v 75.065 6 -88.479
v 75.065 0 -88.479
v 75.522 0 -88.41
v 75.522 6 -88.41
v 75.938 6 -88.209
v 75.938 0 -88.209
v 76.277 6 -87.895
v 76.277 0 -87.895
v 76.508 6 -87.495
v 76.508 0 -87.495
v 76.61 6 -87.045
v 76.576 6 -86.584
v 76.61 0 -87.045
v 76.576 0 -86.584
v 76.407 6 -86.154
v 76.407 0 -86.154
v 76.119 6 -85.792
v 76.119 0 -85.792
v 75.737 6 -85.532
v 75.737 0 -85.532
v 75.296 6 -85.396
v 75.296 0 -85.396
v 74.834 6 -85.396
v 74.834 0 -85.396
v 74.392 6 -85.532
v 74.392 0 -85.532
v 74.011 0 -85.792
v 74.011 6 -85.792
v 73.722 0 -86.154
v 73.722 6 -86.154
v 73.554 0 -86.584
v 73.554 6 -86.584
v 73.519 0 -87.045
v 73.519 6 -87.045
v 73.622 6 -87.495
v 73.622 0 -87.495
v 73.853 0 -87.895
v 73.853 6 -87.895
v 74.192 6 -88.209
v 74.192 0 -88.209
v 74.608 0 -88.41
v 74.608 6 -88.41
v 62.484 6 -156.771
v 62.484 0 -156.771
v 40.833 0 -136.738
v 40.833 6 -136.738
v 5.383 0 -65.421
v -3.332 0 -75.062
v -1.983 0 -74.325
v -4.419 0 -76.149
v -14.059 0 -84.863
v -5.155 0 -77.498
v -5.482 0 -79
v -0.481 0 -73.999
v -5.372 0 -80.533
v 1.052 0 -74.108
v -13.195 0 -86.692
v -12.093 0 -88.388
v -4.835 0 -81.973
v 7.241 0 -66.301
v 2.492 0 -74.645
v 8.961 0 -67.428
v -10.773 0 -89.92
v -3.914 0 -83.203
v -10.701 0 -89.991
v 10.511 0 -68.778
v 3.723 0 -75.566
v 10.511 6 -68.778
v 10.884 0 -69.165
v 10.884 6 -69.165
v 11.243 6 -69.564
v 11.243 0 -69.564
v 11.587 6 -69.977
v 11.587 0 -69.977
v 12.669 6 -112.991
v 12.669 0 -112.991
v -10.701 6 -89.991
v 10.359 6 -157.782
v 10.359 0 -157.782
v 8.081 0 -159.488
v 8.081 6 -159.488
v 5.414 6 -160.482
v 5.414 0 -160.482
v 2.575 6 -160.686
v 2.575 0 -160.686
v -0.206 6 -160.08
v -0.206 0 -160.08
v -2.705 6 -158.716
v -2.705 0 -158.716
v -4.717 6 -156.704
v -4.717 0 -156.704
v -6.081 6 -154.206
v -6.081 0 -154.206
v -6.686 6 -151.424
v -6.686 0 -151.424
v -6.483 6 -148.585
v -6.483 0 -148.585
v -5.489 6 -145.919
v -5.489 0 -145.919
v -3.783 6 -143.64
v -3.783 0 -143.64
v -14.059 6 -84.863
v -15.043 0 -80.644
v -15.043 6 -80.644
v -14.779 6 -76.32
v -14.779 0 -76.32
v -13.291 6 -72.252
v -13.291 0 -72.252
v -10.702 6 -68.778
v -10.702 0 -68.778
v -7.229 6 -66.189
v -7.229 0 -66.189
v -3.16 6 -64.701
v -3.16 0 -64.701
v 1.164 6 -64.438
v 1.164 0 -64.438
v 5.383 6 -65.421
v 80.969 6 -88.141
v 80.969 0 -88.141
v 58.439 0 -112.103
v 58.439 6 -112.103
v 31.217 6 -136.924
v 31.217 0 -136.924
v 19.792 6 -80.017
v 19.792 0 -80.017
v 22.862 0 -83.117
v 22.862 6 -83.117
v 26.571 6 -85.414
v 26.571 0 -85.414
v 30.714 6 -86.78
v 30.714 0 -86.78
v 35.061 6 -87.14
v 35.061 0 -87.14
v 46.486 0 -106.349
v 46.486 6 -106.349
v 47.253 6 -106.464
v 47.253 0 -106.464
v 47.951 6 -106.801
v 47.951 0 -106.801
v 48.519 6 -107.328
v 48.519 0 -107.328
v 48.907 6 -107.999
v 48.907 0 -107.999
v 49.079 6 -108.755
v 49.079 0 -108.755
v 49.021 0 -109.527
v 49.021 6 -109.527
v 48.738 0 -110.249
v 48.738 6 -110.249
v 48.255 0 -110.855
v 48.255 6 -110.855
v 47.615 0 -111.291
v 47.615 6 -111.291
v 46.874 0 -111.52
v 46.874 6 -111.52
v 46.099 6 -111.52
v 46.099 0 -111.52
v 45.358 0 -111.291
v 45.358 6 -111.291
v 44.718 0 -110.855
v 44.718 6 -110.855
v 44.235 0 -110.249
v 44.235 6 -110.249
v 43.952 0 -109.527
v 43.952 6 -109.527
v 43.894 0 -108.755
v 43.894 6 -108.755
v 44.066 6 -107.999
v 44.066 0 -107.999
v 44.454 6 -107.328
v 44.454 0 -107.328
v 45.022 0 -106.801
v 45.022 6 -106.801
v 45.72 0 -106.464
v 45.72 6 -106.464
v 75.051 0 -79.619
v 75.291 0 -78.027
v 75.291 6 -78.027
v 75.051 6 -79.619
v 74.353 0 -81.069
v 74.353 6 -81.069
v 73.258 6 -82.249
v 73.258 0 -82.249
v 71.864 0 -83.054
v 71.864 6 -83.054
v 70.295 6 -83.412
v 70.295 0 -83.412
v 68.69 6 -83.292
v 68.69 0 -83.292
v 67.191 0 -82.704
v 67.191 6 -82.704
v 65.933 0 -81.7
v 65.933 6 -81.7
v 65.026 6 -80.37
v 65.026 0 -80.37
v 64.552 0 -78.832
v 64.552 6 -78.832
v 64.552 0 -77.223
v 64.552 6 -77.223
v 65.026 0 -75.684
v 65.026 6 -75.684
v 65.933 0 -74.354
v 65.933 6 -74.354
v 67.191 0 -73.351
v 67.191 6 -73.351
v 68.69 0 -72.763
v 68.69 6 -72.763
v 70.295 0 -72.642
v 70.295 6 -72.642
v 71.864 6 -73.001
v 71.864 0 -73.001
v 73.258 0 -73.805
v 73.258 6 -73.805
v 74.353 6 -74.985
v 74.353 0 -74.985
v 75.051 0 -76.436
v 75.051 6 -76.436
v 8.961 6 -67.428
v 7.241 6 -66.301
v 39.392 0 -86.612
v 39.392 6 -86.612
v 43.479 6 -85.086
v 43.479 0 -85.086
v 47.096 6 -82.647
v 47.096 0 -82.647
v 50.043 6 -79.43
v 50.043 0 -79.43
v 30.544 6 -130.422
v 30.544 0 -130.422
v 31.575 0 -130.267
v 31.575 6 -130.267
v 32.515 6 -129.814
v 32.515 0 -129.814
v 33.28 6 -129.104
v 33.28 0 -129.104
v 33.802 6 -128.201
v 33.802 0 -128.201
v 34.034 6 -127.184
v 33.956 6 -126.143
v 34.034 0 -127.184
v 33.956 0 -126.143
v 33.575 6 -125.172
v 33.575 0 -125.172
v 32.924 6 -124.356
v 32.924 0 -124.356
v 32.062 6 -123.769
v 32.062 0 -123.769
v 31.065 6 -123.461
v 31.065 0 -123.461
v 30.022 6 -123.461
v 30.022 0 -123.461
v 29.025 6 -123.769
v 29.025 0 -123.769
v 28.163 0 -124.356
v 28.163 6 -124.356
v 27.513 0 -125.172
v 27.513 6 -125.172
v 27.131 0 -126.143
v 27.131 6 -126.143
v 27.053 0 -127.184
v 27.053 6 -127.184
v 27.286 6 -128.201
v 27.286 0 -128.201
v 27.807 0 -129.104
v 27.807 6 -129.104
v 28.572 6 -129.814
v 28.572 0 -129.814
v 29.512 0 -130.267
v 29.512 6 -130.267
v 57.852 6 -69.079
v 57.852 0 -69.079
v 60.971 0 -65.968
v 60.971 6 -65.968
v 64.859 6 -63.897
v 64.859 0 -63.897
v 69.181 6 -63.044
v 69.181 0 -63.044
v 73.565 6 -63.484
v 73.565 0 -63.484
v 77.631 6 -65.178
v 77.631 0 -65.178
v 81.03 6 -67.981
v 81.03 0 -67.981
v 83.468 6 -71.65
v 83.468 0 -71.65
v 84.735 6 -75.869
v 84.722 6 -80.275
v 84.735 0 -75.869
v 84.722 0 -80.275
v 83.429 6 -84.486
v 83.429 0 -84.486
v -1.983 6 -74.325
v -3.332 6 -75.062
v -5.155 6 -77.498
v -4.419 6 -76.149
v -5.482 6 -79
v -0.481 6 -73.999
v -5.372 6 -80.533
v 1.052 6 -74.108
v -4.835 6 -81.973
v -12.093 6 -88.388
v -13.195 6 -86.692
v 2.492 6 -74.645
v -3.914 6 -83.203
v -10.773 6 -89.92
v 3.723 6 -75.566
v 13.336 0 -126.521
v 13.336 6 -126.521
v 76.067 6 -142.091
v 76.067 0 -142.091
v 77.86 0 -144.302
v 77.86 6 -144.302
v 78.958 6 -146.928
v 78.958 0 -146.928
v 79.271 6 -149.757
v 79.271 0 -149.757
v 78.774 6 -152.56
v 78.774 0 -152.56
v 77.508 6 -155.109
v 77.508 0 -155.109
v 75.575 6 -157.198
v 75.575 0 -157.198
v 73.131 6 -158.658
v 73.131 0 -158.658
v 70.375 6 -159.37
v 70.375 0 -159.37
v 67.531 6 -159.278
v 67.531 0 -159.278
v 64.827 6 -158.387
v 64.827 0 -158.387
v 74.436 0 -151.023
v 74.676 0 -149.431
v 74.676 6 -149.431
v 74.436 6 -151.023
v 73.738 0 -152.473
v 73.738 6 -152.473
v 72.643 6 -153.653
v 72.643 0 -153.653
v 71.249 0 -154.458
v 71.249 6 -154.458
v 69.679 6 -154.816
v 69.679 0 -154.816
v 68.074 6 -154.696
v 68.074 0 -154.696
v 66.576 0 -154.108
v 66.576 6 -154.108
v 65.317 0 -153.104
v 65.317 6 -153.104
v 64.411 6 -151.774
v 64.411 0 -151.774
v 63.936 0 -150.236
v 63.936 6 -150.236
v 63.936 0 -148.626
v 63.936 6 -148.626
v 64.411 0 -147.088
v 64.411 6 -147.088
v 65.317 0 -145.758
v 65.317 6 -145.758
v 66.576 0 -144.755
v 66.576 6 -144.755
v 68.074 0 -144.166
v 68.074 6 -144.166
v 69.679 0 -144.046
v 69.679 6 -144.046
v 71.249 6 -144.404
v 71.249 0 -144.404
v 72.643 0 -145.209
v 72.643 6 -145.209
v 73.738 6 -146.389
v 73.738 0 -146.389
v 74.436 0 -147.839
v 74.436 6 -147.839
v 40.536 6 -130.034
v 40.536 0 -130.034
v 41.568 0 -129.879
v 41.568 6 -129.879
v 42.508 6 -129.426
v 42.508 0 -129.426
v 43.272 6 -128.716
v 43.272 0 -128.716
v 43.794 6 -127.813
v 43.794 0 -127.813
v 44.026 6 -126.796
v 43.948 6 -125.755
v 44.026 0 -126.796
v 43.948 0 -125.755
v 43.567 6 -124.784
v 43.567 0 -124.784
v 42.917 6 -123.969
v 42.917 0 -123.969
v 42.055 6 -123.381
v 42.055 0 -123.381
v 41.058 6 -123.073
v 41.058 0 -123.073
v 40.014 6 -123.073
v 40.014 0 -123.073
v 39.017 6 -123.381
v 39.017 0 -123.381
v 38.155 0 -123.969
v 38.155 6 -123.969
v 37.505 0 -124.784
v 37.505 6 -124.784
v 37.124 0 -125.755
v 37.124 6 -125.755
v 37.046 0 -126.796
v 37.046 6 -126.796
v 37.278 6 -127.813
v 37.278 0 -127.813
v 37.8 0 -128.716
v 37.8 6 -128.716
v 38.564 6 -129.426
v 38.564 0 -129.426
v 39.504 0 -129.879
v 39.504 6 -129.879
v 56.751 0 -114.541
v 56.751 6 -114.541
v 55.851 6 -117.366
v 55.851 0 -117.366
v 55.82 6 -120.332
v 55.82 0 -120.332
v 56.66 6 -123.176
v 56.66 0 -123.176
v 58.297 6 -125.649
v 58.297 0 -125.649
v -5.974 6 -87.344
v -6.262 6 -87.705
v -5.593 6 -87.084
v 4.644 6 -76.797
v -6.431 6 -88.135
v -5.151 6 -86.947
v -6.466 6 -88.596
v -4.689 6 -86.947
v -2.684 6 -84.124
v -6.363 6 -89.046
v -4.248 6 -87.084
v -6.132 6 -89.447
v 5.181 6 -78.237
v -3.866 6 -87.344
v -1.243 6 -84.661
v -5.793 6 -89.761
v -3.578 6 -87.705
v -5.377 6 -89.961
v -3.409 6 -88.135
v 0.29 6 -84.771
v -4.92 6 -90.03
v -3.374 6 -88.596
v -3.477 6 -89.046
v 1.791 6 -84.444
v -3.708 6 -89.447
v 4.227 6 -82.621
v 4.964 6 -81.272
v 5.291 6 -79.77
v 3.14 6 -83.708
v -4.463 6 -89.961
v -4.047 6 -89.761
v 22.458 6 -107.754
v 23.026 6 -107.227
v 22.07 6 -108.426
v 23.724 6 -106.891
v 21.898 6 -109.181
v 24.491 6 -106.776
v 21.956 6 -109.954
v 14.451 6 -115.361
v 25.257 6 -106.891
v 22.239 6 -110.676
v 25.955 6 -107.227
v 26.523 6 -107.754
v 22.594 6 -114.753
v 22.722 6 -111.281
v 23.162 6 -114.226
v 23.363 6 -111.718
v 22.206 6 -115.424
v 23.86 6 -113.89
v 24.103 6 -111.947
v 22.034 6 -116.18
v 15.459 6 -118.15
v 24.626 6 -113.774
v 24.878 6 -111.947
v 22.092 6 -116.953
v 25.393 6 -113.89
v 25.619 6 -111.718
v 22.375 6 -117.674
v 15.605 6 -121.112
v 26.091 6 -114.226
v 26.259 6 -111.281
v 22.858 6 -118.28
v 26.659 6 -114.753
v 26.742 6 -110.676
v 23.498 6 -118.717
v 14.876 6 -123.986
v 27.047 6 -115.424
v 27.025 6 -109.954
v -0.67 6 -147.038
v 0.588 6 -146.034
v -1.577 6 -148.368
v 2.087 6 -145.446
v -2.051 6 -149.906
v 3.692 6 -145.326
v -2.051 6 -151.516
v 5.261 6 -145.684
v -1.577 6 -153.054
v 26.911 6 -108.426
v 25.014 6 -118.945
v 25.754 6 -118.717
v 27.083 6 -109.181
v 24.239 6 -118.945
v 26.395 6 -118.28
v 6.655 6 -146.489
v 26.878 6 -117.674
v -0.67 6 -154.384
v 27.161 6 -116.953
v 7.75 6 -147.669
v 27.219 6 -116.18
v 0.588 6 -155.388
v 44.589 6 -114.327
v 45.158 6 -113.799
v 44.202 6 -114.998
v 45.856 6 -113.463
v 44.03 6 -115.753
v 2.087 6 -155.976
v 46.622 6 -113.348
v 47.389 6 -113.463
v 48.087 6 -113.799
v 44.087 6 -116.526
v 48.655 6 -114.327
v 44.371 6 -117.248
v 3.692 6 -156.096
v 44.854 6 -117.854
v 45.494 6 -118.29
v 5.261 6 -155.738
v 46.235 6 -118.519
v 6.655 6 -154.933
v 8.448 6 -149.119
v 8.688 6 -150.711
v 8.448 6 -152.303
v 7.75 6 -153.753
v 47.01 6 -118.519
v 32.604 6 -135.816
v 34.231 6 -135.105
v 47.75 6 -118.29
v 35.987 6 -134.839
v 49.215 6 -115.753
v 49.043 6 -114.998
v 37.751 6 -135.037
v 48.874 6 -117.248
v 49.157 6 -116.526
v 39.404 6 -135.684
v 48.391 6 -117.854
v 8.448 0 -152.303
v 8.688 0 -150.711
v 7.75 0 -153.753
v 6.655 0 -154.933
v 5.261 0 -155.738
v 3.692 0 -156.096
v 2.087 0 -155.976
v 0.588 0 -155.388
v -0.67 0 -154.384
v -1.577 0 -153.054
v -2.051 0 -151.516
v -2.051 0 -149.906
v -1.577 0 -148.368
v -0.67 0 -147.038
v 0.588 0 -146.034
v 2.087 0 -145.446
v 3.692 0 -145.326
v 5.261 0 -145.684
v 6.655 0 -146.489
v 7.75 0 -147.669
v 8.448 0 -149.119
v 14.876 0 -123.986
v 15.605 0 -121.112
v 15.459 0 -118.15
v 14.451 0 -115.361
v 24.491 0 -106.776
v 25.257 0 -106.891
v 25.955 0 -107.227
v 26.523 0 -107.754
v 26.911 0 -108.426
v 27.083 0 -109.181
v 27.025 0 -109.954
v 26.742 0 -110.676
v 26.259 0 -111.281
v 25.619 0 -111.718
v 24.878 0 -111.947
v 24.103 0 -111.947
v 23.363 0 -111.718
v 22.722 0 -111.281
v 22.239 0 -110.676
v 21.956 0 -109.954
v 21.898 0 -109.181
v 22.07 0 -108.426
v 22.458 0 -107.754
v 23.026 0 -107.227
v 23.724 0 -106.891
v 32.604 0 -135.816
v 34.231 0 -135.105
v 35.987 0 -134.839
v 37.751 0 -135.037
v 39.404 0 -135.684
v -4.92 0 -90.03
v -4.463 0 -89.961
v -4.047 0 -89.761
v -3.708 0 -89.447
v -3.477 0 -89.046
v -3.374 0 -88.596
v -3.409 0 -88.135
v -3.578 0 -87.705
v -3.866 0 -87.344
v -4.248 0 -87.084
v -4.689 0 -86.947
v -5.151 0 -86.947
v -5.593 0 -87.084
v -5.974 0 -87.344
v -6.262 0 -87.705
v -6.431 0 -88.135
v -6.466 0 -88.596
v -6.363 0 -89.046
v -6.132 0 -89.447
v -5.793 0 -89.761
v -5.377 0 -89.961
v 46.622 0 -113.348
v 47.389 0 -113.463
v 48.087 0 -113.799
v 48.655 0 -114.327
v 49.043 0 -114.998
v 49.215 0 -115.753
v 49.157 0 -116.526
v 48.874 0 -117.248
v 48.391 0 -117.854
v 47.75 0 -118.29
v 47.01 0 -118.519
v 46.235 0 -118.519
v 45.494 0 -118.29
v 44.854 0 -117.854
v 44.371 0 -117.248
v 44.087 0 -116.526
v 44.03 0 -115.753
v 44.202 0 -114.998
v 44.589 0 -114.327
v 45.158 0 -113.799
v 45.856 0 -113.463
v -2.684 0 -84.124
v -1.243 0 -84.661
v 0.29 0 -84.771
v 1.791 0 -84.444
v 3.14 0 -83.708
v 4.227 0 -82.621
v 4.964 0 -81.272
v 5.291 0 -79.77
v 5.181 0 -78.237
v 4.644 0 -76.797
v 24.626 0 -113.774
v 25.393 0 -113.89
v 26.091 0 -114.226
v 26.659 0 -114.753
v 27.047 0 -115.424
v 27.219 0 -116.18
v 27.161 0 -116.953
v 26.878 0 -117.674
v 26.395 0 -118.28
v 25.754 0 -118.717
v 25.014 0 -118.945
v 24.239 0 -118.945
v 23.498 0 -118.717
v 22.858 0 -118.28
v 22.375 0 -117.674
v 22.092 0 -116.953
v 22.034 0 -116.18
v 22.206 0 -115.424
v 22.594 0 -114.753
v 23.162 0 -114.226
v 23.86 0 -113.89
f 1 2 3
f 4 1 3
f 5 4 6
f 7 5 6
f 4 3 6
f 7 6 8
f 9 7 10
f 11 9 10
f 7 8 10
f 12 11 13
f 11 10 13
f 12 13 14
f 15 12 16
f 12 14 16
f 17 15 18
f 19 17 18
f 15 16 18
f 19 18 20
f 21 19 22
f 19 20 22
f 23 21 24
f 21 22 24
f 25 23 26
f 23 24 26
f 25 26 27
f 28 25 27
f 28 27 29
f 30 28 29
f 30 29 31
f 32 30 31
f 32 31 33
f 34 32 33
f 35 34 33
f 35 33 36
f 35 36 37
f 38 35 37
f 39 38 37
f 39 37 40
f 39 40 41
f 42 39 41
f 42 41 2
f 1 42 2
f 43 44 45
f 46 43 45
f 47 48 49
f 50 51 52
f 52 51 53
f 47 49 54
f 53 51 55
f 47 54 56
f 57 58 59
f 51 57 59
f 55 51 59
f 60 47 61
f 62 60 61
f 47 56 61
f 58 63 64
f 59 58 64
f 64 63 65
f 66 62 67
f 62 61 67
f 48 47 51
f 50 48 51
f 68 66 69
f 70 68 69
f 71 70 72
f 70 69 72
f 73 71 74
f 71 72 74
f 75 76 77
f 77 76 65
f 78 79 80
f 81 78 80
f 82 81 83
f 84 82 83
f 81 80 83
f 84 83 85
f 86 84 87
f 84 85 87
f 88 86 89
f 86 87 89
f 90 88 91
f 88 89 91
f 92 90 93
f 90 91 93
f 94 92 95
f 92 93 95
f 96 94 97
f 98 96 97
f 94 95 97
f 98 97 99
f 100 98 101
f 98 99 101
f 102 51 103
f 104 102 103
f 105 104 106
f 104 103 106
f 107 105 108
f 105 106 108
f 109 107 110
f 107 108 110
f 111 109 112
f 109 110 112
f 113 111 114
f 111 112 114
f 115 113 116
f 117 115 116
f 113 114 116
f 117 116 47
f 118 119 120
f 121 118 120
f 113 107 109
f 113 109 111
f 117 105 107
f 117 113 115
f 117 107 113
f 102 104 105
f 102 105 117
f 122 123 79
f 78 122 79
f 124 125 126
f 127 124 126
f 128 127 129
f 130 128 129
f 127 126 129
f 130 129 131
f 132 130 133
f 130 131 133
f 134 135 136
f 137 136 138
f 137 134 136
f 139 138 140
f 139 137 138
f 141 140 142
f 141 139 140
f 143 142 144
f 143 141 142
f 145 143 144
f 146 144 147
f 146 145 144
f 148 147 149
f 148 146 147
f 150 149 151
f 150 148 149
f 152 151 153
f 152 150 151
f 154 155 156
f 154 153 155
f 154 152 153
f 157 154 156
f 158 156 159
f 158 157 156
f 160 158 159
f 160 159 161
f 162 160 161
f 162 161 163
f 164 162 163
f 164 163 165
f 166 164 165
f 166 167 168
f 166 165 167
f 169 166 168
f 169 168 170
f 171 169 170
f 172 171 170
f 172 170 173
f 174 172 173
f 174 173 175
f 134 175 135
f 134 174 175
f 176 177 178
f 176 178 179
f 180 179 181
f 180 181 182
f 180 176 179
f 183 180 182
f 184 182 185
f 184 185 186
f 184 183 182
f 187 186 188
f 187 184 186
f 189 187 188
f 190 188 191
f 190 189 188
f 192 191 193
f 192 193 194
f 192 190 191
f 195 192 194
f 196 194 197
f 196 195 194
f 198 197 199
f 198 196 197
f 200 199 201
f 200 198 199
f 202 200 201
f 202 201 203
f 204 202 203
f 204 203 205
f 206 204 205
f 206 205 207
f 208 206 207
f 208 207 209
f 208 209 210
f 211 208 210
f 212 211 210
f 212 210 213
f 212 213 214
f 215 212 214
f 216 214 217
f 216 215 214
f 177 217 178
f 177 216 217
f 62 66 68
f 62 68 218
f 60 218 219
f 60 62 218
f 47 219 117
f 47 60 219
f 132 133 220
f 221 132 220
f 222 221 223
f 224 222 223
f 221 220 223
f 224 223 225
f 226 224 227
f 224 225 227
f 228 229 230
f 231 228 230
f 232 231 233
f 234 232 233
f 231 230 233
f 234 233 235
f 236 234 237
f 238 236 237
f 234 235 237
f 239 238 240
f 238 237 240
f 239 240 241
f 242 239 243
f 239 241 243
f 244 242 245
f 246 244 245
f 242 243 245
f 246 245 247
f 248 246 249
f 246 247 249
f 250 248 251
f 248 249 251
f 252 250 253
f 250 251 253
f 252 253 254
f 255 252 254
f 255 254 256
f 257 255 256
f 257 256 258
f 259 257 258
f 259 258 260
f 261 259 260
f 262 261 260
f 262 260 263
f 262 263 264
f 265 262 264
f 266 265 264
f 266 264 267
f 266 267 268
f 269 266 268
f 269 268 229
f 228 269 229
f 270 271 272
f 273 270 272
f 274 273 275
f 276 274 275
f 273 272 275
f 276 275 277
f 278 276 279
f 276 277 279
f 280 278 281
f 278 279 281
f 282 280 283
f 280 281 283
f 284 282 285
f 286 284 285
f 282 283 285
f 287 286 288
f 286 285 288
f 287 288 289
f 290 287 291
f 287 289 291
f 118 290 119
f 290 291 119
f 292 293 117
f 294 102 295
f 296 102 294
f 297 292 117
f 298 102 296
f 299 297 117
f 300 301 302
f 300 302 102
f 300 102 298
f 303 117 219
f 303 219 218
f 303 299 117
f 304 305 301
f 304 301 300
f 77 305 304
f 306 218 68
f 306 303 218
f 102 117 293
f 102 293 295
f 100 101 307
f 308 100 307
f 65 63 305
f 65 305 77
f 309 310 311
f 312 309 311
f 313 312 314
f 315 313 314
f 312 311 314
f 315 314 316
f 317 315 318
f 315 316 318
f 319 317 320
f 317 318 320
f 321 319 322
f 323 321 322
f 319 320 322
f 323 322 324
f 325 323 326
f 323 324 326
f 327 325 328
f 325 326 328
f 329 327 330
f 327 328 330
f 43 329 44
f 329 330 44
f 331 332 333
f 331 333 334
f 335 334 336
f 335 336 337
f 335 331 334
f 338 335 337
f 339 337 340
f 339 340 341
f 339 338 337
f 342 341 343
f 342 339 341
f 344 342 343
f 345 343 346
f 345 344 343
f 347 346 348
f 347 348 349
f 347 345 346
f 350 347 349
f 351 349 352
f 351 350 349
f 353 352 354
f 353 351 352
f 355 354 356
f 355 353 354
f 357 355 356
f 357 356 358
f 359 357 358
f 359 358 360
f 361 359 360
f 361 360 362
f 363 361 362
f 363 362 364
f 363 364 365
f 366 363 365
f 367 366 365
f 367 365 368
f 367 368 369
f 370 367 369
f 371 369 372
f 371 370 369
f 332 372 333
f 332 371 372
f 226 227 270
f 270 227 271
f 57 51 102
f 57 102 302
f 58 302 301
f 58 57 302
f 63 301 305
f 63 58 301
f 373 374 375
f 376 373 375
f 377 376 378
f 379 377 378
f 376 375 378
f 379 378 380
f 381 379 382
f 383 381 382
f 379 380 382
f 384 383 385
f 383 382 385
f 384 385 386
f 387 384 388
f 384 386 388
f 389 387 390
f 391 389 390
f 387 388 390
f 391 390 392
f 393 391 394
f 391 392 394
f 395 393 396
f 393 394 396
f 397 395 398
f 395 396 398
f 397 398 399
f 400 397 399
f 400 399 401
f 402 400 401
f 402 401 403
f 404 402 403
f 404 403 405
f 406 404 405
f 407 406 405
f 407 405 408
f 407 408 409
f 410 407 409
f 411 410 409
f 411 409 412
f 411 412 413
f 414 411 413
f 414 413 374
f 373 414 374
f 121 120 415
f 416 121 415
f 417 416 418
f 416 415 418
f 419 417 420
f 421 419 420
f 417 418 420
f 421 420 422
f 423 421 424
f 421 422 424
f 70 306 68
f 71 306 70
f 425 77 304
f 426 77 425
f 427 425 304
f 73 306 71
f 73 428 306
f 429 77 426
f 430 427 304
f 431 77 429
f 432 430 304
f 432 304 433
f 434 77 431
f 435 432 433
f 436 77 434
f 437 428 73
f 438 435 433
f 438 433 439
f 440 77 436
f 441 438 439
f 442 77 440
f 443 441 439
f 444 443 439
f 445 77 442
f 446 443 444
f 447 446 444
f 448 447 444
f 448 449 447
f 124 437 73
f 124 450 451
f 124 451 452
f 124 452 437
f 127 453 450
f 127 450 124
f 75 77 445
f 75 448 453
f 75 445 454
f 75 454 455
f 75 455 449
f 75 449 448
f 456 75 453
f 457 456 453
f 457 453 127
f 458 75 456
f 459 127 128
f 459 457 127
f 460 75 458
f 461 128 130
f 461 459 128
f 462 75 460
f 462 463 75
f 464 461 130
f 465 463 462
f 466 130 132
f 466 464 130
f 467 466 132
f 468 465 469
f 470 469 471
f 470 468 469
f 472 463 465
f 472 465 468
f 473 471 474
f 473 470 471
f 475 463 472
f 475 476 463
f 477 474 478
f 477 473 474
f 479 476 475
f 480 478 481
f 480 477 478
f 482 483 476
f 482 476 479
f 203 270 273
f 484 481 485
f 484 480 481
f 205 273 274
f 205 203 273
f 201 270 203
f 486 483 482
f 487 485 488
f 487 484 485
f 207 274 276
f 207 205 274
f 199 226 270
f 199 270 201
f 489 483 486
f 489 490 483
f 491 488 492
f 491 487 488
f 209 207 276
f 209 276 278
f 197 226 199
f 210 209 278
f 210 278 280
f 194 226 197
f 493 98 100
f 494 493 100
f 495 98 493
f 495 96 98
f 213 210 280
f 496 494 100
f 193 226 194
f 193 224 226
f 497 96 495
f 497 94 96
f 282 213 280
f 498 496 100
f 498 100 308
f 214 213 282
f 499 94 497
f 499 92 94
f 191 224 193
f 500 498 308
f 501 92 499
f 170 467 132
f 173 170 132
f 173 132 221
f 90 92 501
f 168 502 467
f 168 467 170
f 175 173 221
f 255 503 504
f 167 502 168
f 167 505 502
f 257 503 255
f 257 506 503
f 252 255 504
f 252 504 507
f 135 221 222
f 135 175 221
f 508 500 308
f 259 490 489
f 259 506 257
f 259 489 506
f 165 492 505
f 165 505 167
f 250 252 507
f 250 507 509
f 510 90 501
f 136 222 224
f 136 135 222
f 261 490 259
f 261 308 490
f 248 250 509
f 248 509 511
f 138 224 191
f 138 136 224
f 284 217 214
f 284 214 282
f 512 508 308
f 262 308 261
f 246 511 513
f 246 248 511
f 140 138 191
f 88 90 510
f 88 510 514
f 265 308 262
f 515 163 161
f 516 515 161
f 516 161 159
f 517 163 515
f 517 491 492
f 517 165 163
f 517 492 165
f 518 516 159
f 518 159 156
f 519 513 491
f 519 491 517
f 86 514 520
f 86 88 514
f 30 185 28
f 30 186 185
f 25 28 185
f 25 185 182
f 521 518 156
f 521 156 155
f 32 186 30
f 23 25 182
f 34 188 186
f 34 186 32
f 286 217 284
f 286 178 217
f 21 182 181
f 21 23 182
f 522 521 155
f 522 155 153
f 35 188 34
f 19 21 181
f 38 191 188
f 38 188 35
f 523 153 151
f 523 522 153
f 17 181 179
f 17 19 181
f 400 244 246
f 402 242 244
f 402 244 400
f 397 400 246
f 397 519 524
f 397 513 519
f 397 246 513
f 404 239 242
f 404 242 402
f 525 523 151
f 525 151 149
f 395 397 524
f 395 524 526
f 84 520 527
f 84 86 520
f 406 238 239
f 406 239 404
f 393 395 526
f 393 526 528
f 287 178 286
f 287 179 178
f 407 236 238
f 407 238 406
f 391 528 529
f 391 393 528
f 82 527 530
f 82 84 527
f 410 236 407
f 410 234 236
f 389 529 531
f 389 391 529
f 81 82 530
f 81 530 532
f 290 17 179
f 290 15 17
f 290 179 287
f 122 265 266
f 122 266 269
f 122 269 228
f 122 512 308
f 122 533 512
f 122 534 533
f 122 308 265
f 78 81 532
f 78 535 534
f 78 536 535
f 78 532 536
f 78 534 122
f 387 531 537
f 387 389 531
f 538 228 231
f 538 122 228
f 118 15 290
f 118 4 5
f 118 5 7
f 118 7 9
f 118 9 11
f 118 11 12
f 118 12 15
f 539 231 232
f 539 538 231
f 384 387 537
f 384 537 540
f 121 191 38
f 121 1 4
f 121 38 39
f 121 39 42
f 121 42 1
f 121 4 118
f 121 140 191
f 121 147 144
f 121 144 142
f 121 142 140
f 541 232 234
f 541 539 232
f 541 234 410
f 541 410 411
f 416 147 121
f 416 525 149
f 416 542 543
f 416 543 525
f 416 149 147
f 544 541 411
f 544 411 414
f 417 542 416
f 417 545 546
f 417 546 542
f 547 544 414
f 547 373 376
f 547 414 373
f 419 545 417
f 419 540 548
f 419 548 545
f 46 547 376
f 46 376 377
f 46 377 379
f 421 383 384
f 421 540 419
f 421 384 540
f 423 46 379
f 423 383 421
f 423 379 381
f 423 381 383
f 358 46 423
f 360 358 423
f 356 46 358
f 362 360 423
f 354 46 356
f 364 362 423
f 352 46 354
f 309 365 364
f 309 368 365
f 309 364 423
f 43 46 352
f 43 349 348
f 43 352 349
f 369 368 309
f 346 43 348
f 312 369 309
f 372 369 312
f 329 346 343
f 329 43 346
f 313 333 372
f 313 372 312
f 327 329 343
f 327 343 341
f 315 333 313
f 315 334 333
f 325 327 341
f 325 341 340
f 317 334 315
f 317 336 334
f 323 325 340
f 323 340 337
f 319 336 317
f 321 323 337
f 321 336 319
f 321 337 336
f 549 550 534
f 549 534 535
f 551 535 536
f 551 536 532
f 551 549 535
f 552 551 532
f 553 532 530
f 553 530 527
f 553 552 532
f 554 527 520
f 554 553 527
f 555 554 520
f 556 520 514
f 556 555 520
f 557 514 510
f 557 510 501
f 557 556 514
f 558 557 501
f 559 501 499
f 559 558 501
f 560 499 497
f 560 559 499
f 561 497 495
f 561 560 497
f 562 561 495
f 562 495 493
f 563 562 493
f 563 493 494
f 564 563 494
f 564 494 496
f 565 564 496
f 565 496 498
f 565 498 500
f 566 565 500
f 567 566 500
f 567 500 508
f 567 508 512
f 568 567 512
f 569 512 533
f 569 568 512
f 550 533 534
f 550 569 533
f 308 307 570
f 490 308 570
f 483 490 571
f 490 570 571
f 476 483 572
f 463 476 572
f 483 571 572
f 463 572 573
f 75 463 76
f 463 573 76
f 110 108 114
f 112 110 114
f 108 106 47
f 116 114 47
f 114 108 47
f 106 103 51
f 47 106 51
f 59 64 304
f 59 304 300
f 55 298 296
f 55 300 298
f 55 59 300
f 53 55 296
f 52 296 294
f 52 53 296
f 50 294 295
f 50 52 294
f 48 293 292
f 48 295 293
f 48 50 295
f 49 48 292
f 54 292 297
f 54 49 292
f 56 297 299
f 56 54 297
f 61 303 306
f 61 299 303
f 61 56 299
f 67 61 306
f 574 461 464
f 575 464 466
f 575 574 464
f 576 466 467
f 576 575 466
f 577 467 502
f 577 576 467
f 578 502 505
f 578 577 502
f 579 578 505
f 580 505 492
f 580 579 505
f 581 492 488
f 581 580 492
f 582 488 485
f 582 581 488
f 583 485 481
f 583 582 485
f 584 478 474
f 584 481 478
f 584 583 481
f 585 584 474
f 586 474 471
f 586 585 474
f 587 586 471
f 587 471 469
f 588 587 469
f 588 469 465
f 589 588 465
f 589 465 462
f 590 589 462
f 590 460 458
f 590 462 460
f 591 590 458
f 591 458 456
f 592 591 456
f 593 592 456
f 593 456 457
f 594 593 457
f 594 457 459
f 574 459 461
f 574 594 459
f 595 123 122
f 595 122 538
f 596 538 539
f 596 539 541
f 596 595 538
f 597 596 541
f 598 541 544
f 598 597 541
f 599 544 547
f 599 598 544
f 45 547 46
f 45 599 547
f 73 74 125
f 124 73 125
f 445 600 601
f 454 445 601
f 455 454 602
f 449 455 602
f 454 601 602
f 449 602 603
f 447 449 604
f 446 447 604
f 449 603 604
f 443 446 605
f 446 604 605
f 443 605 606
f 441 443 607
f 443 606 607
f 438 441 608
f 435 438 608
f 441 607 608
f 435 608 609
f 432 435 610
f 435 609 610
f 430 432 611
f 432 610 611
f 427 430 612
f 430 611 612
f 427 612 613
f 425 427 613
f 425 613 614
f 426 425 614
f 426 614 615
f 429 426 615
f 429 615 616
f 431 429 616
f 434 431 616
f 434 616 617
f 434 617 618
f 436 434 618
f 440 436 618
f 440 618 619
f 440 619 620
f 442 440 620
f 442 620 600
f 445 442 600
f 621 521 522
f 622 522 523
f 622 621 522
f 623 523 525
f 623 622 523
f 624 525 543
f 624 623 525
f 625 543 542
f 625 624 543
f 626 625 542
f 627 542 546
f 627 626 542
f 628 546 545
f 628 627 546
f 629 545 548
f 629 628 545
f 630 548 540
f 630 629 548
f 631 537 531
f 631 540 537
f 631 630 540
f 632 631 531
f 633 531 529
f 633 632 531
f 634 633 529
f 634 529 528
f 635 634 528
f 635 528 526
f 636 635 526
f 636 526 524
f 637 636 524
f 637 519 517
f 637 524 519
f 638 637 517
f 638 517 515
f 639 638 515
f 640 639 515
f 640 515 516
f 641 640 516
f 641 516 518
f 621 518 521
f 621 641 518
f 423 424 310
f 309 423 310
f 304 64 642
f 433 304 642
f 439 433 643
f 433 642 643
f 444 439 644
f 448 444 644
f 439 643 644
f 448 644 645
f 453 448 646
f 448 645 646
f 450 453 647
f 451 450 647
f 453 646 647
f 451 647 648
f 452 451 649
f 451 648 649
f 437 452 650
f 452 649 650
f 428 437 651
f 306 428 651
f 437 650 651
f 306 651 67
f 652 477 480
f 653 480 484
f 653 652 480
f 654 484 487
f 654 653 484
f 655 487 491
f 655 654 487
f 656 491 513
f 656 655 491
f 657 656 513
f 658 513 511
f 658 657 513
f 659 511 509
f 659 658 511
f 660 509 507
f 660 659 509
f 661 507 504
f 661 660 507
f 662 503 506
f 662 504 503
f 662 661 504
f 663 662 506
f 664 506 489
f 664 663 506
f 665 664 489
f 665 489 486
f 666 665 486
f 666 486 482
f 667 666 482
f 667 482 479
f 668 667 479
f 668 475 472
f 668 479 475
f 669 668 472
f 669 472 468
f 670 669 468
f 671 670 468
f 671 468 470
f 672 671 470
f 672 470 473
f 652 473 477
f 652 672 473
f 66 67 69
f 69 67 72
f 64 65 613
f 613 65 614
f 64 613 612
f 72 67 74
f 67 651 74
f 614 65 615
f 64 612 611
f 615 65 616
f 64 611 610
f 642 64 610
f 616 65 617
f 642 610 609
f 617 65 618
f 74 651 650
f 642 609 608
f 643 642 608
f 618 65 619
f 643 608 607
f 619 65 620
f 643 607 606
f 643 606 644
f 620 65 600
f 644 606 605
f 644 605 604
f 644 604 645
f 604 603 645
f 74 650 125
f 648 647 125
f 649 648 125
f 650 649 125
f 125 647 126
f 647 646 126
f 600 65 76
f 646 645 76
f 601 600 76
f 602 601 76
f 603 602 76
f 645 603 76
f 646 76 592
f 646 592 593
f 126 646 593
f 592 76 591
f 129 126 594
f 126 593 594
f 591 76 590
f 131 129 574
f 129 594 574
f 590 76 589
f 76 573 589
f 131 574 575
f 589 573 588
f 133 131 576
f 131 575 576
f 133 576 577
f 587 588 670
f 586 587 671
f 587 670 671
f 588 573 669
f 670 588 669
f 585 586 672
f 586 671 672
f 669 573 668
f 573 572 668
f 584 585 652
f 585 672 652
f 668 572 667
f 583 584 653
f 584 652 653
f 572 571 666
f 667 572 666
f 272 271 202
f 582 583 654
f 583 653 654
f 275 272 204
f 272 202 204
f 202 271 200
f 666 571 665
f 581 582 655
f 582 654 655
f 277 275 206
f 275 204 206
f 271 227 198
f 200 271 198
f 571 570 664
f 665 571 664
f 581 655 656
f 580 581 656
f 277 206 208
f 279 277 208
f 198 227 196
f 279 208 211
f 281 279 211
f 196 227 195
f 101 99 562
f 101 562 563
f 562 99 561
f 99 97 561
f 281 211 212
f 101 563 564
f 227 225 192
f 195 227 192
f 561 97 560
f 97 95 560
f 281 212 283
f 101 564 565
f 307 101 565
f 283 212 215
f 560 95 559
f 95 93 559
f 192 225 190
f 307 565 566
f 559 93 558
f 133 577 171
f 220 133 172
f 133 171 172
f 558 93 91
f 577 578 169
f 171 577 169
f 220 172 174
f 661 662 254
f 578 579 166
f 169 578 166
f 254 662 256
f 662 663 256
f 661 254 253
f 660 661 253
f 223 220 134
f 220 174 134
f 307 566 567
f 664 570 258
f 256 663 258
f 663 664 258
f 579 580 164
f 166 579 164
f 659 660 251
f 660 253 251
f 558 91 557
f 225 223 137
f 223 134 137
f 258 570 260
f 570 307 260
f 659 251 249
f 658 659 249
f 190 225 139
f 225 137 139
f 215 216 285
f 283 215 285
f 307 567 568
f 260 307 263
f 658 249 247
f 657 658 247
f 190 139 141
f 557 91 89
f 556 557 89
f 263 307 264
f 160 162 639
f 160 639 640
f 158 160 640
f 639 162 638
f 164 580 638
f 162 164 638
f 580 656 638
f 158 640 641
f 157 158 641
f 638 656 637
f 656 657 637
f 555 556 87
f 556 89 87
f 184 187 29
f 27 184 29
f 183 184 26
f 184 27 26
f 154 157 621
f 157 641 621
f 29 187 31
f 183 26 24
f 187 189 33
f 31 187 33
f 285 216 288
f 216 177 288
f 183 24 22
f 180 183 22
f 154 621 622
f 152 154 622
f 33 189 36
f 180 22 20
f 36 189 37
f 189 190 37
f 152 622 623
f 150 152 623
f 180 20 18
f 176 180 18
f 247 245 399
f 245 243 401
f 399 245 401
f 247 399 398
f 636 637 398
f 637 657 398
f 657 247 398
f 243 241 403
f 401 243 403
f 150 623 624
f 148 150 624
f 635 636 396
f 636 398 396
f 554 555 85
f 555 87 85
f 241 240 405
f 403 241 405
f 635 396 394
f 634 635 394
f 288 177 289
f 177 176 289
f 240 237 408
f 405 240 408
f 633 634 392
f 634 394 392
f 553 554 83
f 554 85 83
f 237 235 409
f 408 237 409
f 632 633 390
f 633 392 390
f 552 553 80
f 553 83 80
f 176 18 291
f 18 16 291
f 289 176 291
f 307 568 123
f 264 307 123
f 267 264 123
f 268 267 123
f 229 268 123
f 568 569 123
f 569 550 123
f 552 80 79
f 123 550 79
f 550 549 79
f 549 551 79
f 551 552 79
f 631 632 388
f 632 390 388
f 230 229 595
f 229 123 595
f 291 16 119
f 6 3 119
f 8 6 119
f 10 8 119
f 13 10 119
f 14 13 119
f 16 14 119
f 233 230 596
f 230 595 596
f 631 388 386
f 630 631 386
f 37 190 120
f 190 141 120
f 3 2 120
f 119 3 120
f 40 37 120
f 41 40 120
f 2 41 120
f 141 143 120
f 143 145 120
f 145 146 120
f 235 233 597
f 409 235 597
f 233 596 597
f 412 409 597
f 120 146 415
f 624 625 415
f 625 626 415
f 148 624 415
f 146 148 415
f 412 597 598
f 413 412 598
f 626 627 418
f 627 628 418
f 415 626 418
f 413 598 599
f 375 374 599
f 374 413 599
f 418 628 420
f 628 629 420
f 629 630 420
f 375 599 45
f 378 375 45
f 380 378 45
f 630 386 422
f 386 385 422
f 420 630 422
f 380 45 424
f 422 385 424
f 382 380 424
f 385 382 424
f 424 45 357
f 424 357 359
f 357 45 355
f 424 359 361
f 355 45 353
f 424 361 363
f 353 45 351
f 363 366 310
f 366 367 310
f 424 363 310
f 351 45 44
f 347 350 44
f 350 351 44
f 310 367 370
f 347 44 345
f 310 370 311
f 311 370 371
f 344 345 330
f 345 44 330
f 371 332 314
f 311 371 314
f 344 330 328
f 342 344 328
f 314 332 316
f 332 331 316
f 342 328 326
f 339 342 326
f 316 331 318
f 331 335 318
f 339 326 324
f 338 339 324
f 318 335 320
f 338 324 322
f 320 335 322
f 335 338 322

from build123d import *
from build123d.topology import SkipClean

# Parameters (mm, degrees)
SZKIC13_R                          = 5.4
DODANIE_WYCI_GNI_CIE3_DEPTH        = 6
OBIEKT_PRZENIE_KOPIUJ1_START       = -54.137810474
OBIEKT_PRZENIE_KOPIUJ1_DEPTH       = 123.583165808
OBIEKT_PRZENIE_KOPIUJ1_START_2     = 6
OBIEKT_PRZENIE_KOPIUJ1_2_DEPTH     = 63.445355334
OBIEKT_PRZENIE_KOPIUJ1_3_DEPTH     = 54.137810474
OBIEKT_PRZENIE_KOPIUJ1_4_OUTLINE_R = 5.4
OBIEKT_PRZENIE_KOPIUJ1_4_DEPTH     = 6
SZKIC15_R                          = 2.6
WYTNIJ_WYCI_GNI_CIE3_DEPTH         = 136.234453644
SZKIC16_R                          = 1.549999999
WYTNIJ_WYCI_GNI_CIE4_DEPTH         = 134.002110995
WYTNIJ_WYCI_GNI_CIE6_START         = -6
WYTNIJ_WYCI_GNI_CIE6_DEPTH         = 6
SZKIC21_R                          = 3.5
WYTNIJ_WYCI_GNI_CIE7_DEPTH         = 10


# Read off the part's stored shape, not the designer's step: Obiekt-Przenieś/Kopiuj1
with BuildPart() as part:
    # Szkic13 → Dodanie-wyciągnięcie3 (new body)
    with BuildSketch(Plane(origin=(39.644620081, 0, -39.644620081), x_dir=(0.5000000000000003, 0.7071067811865474, 0.4999999999999999), z_dir=(-0.7071067811865474, 0, 0.7071067811865478))):
        with BuildLine():
            Line((-26.485954128, 69.418447832), (-4.834933244, 89.451777745))
            ThreePointArc((-4.834933244, 89.451777745), (9.296564873, 88.903360978), (8.748148106, 74.77186286))
            Line((8.748148106, 74.77186286), (-9.022064337, 58.329380521))
            ThreePointArc((-9.022064337, 58.329380521), (-11.594140152, 51.528763252), (-8.880109301, 44.783542294))
            Line((-8.880109301, 44.783542294), (13.650061572, 20.82128103))
            ThreePointArc((13.650061572, 20.82128103), (12.1147202, -0.864967436), (-9.466757772, 1.760000028))
            Line((-9.466757772, 1.760000028), (-17.276570768, 12.111077891))
            ThreePointArc((-17.276570768, 12.111077891), (-23.840592648, 17.766605638), (-32.257835604, 19.821209823))
            ThreePointArc((-32.257835604, 19.821209823), (-40.748422568, 18.094562685), (-47.526822354, 12.697834632))
            Line((-47.526822354, 12.697834632), (-55.73216456, 2.657398822))
            ThreePointArc((-55.73216456, 2.657398822), (-77.39920267, 0.871312261), (-78.092419853, 22.600787532))
            Line((-78.092419853, 22.600787532), (-54.649965194, 45.671329009))
            ThreePointArc((-54.649965194, 45.671329009), (-51.676403404, 52.306229122), (-53.982823937, 59.201473392))
            Line((-53.982823937, 59.201473392), (-71.102048157, 76.320697612))
            ThreePointArc((-71.102048157, 76.320697612), (-71.102048157, 90.462833236), (-56.959912533, 90.462833236))
            Line((-56.959912533, 90.462833236), (-36.102048157, 69.604968859))
            ThreePointArc((-36.102048157, 69.604968859), (-31.32360944, 67.985252158), (-26.485954128, 69.418447832))
        make_face()
        with Locations(Location((-67.414852174, 12.0656298, 0), (0, 0, 315))):
            Circle(SZKIC13_R, mode=Mode.SUBTRACT)
        with Locations(Location((-64.030980345, 83.391765424, 0), (0, 0, 315))):
            Circle(SZKIC13_R, mode=Mode.SUBTRACT)
        with Locations(Location((2.571983346, 10.708112247, 0), (0, 0, 135))):
            Circle(SZKIC13_R, mode=Mode.SUBTRACT)
        with Locations(Location((1.956607431, 82.111820303, 0), (0, 0, 135))):
            Circle(SZKIC13_R, mode=Mode.SUBTRACT)
    extrude(amount=DODANIE_WYCI_GNI_CIE3_DEPTH)

    # Obiekt-Przenieś/Kopiuj1 outline → Obiekt-Przenieś/Kopiuj1 (cut)
    with BuildSketch(Plane(origin=(0, 0, 0), x_dir=(1, 0, 0), z_dir=(0, 1, 0)).offset(OBIEKT_PRZENIE_KOPIUJ1_START)):
        with BuildLine():
            Line((52.289240162, 27), (10.510980812, 68.77825935))
            ThreePointArc((10.510980812, 68.77825935), (8.120217457, 66.834960669), (5.382849455, 65.421109333))
            Line((5.382849455, 65.421109333), (41.940516661, 28.863442126))
            Line((41.940516661, 28.863442126), (43.803958787, 27))
            Line((43.803958787, 27), (52.289240162, 27))
        make_face()
        with BuildLine():
            ThreePointArc((-3.913997524, 83.203237686), (-3.913997524, 75.56648445), (3.722755712, 75.56648445))
            Line((3.722755712, 75.56648445), (-3.913997524, 83.203237686))
        make_face()
        with BuildLine():
            Line((-45.380461302, 116.18442009), (-14.05937264, 84.863331428))
            ThreePointArc((-14.05937264, 84.863331428), (-12.673028326, 87.558527478), (-10.773188585, 89.9200188))
            Line((-10.773188585, 89.9200188), (-10.701414264, 89.990654426))
            Line((-10.701414264, 89.990654426), (-47, 126.289240162))
            Line((-47, 126.289240162), (-47, 117.803958788))
            Line((-47, 117.803958788), (-45.380461302, 116.18442009))
        make_face()
    extrude(amount=OBIEKT_PRZENIE_KOPIUJ1_DEPTH, mode=Mode.SUBTRACT)

    # Obiekt-Przenie_Kopiuj1 2 outline → Obiekt-Przenie_Kopiuj1 2 (cut)
    with BuildSketch(Plane(origin=(0, 0, 0), x_dir=(1, 0, 0), z_dir=(0, 1, 0)).offset(OBIEKT_PRZENIE_KOPIUJ1_START_2)):
        with BuildLine():
            ThreePointArc((5.382849455, 65.421109333), (8.120217457, 66.834960669), (10.510980812, 68.77825935))
            Line((10.510980812, 68.77825935), (3.722755712, 75.56648445))
            ThreePointArc((3.722755712, 75.56648445), (-3.913997524, 75.56648445), (-3.913997524, 83.203237686))
            Line((-3.913997524, 83.203237686), (-10.701414264, 89.990654426))
            Line((-10.701414264, 89.990654426), (-10.773188585, 89.9200188))
            ThreePointArc((-10.773188585, 89.9200188), (-12.673028326, 87.558527478), (-14.05937264, 84.863331428))
            Line((-14.05937264, 84.863331428), (5.382849455, 65.421109333))
        make_face()
    extrude(amount=OBIEKT_PRZENIE_KOPIUJ1_2_DEPTH, mode=Mode.SUBTRACT)

    # Obiekt-Przenie_Kopiuj1 3 outline → Obiekt-Przenie_Kopiuj1 3 (cut)
    with BuildSketch(Plane(origin=(0, 0, 0), x_dir=(1, 0, 0), z_dir=(0, 1, 0)).offset(OBIEKT_PRZENIE_KOPIUJ1_START)):
        with BuildLine():
            ThreePointArc((5.382849455, 65.421109333), (8.120217457, 66.834960669), (10.510980812, 68.77825935))
            Line((10.510980812, 68.77825935), (3.722755712, 75.56648445))
            ThreePointArc((3.722755712, 75.56648445), (-3.913997524, 75.56648445), (-3.913997524, 83.203237686))
            Line((-3.913997524, 83.203237686), (-10.701414264, 89.990654426))
            Line((-10.701414264, 89.990654426), (-10.773188585, 89.9200188))
            ThreePointArc((-10.773188585, 89.9200188), (-12.673028326, 87.558527478), (-14.05937264, 84.863331428))
            Line((-14.05937264, 84.863331428), (5.382849455, 65.421109333))
        make_face()
    extrude(amount=OBIEKT_PRZENIE_KOPIUJ1_3_DEPTH, mode=Mode.SUBTRACT)

    # Obiekt-Przenie_Kopiuj1 4 outline → Obiekt-Przenie_Kopiuj1 4 (add)
    # profile 1 of 2: a face of its own
    with SkipClean():  # the faces are left unmerged after this step: merging them gives an invalid solid
        with BuildSketch(Plane(origin=(0, 0, 0), x_dir=(1, 0, 0), z_dir=(0, 1, 0))):
            with BuildLine():
                ThreePointArc((10.510980812, 68.77825935), (11.065119564, 69.362991373), (11.587066708, 69.97663009))
                Line((11.587066708, 69.97663009), (19.792408914, 80.0170659))
                ThreePointArc((19.792408914, 80.0170659), (26.5708087, 85.413793952), (35.061395664, 87.14044109))
                ThreePointArc((35.061395664, 87.14044109), (43.47863862, 85.085836906), (50.0426605, 79.430309159))
                Line((50.0426605, 79.430309159), (57.852473496, 69.079231296))
                ThreePointArc((57.852473496, 69.079231296), (79.433951468, 66.454263832), (80.969292839, 88.140512298))
                Line((80.969292839, 88.140512298), (58.439121967, 112.102773562))
                ThreePointArc((58.439121967, 112.102773562), (55.725091116, 118.84799452), (58.297166931, 125.648611789))
                Line((58.297166931, 125.648611789), (76.067379374, 142.091094128))
                ThreePointArc((76.067379374, 142.091094128), (76.615796141, 156.222592245), (62.484298024, 156.771009013))
                Line((62.484298024, 156.771009013), (40.83327714, 136.7376791))
                ThreePointArc((40.83327714, 136.7376791), (35.995621828, 135.304483426), (31.217183111, 136.924200127))
                Line((31.217183111, 136.924200127), (10.359318735, 157.782064504))
                ThreePointArc((10.359318735, 157.782064504), (-3.782816889, 157.782064504), (-3.782816889, 143.63992888))
                Line((-3.782816889, 143.63992888), (13.33640733, 126.52070466))
                ThreePointArc((13.33640733, 126.52070466), (15.642827864, 119.62546039), (12.669266074, 112.990560277))
                Line((12.669266074, 112.990560277), (-10.701414264, 89.990654426))
                Line((-10.701414264, 89.990654426), (-3.913997524, 83.203237686))
                ThreePointArc((-3.913997524, 83.203237686), (3.722755712, 83.203237686), (3.722755712, 75.56648445))
                Line((3.722755712, 75.56648445), (10.510980812, 68.77825935))
            make_face()
            with Locations((69.891214614, 78.027343515)):
                Circle(OBIEKT_PRZENIE_KOPIUJ1_4_OUTLINE_R, mode=Mode.SUBTRACT)
            with Locations((3.288250923, 150.710996692)):
                Circle(OBIEKT_PRZENIE_KOPIUJ1_4_OUTLINE_R, mode=Mode.SUBTRACT)
            with Locations((69.275838699, 149.43105157)):
                Circle(OBIEKT_PRZENIE_KOPIUJ1_4_OUTLINE_R, mode=Mode.SUBTRACT)
        # profile 2 of 2: a face of its own
        with BuildSketch(Plane(origin=(0, 0, 0), x_dir=(1, 0, 0), z_dir=(0, 1, 0))):
            with BuildLine():
                ThreePointArc((-14.05937264, 84.863331428), (-10.702222624, 68.778259349), (5.382849455, 65.421109333))
                Line((5.382849455, 65.421109333), (-14.05937264, 84.863331428))
            make_face()
        extrude(amount=OBIEKT_PRZENIE_KOPIUJ1_4_DEPTH)

    # Szkic15 → Wytnij-wyciągnięcie3 (cut, through all)
    with SkipClean():  # the faces are left unmerged after this step: merging them gives an invalid solid
        with BuildSketch(Plane(origin=(35.401979394, 0, -35.401979394), x_dir=(0.7071067811865477, 0, 0.7071067811865475), z_dir=(0, 1, 0))):
            with Locations(Location((-60.022716756, 44.591718177, 0), (0, 0, 315))):
                Circle(SZKIC15_R)
            with Locations(Location((-64.875542369, 49.636525763, 0), (0, 0, 315))):
                Circle(SZKIC15_R)
            with Locations(Location((-44.167607201, 59.843455816, 0), (0, 0, 315))):
                Circle(SZKIC15_R)
            with Locations(Location((-49.020432814, 64.888263402, 0), (0, 0, 315))):
                Circle(SZKIC15_R)
        extrude(amount=WYTNIJ_WYCI_GNI_CIE3_DEPTH, mode=Mode.SUBTRACT)

    # Szkic16 → Wytnij-wyciągnięcie4 (cut, through all)
    with SkipClean():  # the faces are left unmerged after this step: merging them gives an invalid solid
        with BuildSketch(Plane(origin=(39.644620081, 0, -39.644620081), x_dir=(0.7071067811865477, 0, 0.7071067811865475), z_dir=(0, -1, 0))):
            with Locations(Location((-8.389025144, -58.480741313, 0), (0, 0, 225))):
                Circle(SZKIC16_R)
            with Locations(Location((-66.04396898, -3.019877172, 0), (0, 0, 225))):
                Circle(SZKIC16_R)
        extrude(amount=-WYTNIJ_WYCI_GNI_CIE4_DEPTH, mode=Mode.SUBTRACT)

    # Szkic19 → Wytnij-wyciągnięcie6 (cut)
    with SkipClean():  # the faces are left unmerged after this step: merging them gives an invalid solid
        with BuildSketch(Plane(origin=(0, 6, 0), x_dir=(1, 0, 0), z_dir=(0, 1, 0)).offset(WYTNIJ_WYCI_GNI_CIE6_START)):
            with BuildLine():
                ThreePointArc((31.217183111, 136.924200127), (35.986600356, 134.839381332), (40.83327714, 136.7376791))
                ThreePointArc((40.83327714, 136.7376791), (35.995621828, 135.304483426), (31.217183111, 136.924200127))
            make_face()
        extrude(amount=WYTNIJ_WYCI_GNI_CIE6_DEPTH, mode=Mode.SUBTRACT)

    # Szkic21 → Wytnij-wyciągnięcie7 (cut)
    with SkipClean():  # the faces are left unmerged after this step: merging them gives an invalid solid
        with BuildSketch(Plane.XZ):
            with Locations(Location((40.536067614, -126.534237996, 0), (0, 0, 270))):
                Circle(SZKIC21_R)
            with Locations(Location((30.543589467, -126.922027211, 0), (0, 0, 270))):
                Circle(SZKIC21_R)
        extrude(amount=-WYTNIJ_WYCI_GNI_CIE7_DEPTH, mode=Mode.SUBTRACT)


solid = part.part
